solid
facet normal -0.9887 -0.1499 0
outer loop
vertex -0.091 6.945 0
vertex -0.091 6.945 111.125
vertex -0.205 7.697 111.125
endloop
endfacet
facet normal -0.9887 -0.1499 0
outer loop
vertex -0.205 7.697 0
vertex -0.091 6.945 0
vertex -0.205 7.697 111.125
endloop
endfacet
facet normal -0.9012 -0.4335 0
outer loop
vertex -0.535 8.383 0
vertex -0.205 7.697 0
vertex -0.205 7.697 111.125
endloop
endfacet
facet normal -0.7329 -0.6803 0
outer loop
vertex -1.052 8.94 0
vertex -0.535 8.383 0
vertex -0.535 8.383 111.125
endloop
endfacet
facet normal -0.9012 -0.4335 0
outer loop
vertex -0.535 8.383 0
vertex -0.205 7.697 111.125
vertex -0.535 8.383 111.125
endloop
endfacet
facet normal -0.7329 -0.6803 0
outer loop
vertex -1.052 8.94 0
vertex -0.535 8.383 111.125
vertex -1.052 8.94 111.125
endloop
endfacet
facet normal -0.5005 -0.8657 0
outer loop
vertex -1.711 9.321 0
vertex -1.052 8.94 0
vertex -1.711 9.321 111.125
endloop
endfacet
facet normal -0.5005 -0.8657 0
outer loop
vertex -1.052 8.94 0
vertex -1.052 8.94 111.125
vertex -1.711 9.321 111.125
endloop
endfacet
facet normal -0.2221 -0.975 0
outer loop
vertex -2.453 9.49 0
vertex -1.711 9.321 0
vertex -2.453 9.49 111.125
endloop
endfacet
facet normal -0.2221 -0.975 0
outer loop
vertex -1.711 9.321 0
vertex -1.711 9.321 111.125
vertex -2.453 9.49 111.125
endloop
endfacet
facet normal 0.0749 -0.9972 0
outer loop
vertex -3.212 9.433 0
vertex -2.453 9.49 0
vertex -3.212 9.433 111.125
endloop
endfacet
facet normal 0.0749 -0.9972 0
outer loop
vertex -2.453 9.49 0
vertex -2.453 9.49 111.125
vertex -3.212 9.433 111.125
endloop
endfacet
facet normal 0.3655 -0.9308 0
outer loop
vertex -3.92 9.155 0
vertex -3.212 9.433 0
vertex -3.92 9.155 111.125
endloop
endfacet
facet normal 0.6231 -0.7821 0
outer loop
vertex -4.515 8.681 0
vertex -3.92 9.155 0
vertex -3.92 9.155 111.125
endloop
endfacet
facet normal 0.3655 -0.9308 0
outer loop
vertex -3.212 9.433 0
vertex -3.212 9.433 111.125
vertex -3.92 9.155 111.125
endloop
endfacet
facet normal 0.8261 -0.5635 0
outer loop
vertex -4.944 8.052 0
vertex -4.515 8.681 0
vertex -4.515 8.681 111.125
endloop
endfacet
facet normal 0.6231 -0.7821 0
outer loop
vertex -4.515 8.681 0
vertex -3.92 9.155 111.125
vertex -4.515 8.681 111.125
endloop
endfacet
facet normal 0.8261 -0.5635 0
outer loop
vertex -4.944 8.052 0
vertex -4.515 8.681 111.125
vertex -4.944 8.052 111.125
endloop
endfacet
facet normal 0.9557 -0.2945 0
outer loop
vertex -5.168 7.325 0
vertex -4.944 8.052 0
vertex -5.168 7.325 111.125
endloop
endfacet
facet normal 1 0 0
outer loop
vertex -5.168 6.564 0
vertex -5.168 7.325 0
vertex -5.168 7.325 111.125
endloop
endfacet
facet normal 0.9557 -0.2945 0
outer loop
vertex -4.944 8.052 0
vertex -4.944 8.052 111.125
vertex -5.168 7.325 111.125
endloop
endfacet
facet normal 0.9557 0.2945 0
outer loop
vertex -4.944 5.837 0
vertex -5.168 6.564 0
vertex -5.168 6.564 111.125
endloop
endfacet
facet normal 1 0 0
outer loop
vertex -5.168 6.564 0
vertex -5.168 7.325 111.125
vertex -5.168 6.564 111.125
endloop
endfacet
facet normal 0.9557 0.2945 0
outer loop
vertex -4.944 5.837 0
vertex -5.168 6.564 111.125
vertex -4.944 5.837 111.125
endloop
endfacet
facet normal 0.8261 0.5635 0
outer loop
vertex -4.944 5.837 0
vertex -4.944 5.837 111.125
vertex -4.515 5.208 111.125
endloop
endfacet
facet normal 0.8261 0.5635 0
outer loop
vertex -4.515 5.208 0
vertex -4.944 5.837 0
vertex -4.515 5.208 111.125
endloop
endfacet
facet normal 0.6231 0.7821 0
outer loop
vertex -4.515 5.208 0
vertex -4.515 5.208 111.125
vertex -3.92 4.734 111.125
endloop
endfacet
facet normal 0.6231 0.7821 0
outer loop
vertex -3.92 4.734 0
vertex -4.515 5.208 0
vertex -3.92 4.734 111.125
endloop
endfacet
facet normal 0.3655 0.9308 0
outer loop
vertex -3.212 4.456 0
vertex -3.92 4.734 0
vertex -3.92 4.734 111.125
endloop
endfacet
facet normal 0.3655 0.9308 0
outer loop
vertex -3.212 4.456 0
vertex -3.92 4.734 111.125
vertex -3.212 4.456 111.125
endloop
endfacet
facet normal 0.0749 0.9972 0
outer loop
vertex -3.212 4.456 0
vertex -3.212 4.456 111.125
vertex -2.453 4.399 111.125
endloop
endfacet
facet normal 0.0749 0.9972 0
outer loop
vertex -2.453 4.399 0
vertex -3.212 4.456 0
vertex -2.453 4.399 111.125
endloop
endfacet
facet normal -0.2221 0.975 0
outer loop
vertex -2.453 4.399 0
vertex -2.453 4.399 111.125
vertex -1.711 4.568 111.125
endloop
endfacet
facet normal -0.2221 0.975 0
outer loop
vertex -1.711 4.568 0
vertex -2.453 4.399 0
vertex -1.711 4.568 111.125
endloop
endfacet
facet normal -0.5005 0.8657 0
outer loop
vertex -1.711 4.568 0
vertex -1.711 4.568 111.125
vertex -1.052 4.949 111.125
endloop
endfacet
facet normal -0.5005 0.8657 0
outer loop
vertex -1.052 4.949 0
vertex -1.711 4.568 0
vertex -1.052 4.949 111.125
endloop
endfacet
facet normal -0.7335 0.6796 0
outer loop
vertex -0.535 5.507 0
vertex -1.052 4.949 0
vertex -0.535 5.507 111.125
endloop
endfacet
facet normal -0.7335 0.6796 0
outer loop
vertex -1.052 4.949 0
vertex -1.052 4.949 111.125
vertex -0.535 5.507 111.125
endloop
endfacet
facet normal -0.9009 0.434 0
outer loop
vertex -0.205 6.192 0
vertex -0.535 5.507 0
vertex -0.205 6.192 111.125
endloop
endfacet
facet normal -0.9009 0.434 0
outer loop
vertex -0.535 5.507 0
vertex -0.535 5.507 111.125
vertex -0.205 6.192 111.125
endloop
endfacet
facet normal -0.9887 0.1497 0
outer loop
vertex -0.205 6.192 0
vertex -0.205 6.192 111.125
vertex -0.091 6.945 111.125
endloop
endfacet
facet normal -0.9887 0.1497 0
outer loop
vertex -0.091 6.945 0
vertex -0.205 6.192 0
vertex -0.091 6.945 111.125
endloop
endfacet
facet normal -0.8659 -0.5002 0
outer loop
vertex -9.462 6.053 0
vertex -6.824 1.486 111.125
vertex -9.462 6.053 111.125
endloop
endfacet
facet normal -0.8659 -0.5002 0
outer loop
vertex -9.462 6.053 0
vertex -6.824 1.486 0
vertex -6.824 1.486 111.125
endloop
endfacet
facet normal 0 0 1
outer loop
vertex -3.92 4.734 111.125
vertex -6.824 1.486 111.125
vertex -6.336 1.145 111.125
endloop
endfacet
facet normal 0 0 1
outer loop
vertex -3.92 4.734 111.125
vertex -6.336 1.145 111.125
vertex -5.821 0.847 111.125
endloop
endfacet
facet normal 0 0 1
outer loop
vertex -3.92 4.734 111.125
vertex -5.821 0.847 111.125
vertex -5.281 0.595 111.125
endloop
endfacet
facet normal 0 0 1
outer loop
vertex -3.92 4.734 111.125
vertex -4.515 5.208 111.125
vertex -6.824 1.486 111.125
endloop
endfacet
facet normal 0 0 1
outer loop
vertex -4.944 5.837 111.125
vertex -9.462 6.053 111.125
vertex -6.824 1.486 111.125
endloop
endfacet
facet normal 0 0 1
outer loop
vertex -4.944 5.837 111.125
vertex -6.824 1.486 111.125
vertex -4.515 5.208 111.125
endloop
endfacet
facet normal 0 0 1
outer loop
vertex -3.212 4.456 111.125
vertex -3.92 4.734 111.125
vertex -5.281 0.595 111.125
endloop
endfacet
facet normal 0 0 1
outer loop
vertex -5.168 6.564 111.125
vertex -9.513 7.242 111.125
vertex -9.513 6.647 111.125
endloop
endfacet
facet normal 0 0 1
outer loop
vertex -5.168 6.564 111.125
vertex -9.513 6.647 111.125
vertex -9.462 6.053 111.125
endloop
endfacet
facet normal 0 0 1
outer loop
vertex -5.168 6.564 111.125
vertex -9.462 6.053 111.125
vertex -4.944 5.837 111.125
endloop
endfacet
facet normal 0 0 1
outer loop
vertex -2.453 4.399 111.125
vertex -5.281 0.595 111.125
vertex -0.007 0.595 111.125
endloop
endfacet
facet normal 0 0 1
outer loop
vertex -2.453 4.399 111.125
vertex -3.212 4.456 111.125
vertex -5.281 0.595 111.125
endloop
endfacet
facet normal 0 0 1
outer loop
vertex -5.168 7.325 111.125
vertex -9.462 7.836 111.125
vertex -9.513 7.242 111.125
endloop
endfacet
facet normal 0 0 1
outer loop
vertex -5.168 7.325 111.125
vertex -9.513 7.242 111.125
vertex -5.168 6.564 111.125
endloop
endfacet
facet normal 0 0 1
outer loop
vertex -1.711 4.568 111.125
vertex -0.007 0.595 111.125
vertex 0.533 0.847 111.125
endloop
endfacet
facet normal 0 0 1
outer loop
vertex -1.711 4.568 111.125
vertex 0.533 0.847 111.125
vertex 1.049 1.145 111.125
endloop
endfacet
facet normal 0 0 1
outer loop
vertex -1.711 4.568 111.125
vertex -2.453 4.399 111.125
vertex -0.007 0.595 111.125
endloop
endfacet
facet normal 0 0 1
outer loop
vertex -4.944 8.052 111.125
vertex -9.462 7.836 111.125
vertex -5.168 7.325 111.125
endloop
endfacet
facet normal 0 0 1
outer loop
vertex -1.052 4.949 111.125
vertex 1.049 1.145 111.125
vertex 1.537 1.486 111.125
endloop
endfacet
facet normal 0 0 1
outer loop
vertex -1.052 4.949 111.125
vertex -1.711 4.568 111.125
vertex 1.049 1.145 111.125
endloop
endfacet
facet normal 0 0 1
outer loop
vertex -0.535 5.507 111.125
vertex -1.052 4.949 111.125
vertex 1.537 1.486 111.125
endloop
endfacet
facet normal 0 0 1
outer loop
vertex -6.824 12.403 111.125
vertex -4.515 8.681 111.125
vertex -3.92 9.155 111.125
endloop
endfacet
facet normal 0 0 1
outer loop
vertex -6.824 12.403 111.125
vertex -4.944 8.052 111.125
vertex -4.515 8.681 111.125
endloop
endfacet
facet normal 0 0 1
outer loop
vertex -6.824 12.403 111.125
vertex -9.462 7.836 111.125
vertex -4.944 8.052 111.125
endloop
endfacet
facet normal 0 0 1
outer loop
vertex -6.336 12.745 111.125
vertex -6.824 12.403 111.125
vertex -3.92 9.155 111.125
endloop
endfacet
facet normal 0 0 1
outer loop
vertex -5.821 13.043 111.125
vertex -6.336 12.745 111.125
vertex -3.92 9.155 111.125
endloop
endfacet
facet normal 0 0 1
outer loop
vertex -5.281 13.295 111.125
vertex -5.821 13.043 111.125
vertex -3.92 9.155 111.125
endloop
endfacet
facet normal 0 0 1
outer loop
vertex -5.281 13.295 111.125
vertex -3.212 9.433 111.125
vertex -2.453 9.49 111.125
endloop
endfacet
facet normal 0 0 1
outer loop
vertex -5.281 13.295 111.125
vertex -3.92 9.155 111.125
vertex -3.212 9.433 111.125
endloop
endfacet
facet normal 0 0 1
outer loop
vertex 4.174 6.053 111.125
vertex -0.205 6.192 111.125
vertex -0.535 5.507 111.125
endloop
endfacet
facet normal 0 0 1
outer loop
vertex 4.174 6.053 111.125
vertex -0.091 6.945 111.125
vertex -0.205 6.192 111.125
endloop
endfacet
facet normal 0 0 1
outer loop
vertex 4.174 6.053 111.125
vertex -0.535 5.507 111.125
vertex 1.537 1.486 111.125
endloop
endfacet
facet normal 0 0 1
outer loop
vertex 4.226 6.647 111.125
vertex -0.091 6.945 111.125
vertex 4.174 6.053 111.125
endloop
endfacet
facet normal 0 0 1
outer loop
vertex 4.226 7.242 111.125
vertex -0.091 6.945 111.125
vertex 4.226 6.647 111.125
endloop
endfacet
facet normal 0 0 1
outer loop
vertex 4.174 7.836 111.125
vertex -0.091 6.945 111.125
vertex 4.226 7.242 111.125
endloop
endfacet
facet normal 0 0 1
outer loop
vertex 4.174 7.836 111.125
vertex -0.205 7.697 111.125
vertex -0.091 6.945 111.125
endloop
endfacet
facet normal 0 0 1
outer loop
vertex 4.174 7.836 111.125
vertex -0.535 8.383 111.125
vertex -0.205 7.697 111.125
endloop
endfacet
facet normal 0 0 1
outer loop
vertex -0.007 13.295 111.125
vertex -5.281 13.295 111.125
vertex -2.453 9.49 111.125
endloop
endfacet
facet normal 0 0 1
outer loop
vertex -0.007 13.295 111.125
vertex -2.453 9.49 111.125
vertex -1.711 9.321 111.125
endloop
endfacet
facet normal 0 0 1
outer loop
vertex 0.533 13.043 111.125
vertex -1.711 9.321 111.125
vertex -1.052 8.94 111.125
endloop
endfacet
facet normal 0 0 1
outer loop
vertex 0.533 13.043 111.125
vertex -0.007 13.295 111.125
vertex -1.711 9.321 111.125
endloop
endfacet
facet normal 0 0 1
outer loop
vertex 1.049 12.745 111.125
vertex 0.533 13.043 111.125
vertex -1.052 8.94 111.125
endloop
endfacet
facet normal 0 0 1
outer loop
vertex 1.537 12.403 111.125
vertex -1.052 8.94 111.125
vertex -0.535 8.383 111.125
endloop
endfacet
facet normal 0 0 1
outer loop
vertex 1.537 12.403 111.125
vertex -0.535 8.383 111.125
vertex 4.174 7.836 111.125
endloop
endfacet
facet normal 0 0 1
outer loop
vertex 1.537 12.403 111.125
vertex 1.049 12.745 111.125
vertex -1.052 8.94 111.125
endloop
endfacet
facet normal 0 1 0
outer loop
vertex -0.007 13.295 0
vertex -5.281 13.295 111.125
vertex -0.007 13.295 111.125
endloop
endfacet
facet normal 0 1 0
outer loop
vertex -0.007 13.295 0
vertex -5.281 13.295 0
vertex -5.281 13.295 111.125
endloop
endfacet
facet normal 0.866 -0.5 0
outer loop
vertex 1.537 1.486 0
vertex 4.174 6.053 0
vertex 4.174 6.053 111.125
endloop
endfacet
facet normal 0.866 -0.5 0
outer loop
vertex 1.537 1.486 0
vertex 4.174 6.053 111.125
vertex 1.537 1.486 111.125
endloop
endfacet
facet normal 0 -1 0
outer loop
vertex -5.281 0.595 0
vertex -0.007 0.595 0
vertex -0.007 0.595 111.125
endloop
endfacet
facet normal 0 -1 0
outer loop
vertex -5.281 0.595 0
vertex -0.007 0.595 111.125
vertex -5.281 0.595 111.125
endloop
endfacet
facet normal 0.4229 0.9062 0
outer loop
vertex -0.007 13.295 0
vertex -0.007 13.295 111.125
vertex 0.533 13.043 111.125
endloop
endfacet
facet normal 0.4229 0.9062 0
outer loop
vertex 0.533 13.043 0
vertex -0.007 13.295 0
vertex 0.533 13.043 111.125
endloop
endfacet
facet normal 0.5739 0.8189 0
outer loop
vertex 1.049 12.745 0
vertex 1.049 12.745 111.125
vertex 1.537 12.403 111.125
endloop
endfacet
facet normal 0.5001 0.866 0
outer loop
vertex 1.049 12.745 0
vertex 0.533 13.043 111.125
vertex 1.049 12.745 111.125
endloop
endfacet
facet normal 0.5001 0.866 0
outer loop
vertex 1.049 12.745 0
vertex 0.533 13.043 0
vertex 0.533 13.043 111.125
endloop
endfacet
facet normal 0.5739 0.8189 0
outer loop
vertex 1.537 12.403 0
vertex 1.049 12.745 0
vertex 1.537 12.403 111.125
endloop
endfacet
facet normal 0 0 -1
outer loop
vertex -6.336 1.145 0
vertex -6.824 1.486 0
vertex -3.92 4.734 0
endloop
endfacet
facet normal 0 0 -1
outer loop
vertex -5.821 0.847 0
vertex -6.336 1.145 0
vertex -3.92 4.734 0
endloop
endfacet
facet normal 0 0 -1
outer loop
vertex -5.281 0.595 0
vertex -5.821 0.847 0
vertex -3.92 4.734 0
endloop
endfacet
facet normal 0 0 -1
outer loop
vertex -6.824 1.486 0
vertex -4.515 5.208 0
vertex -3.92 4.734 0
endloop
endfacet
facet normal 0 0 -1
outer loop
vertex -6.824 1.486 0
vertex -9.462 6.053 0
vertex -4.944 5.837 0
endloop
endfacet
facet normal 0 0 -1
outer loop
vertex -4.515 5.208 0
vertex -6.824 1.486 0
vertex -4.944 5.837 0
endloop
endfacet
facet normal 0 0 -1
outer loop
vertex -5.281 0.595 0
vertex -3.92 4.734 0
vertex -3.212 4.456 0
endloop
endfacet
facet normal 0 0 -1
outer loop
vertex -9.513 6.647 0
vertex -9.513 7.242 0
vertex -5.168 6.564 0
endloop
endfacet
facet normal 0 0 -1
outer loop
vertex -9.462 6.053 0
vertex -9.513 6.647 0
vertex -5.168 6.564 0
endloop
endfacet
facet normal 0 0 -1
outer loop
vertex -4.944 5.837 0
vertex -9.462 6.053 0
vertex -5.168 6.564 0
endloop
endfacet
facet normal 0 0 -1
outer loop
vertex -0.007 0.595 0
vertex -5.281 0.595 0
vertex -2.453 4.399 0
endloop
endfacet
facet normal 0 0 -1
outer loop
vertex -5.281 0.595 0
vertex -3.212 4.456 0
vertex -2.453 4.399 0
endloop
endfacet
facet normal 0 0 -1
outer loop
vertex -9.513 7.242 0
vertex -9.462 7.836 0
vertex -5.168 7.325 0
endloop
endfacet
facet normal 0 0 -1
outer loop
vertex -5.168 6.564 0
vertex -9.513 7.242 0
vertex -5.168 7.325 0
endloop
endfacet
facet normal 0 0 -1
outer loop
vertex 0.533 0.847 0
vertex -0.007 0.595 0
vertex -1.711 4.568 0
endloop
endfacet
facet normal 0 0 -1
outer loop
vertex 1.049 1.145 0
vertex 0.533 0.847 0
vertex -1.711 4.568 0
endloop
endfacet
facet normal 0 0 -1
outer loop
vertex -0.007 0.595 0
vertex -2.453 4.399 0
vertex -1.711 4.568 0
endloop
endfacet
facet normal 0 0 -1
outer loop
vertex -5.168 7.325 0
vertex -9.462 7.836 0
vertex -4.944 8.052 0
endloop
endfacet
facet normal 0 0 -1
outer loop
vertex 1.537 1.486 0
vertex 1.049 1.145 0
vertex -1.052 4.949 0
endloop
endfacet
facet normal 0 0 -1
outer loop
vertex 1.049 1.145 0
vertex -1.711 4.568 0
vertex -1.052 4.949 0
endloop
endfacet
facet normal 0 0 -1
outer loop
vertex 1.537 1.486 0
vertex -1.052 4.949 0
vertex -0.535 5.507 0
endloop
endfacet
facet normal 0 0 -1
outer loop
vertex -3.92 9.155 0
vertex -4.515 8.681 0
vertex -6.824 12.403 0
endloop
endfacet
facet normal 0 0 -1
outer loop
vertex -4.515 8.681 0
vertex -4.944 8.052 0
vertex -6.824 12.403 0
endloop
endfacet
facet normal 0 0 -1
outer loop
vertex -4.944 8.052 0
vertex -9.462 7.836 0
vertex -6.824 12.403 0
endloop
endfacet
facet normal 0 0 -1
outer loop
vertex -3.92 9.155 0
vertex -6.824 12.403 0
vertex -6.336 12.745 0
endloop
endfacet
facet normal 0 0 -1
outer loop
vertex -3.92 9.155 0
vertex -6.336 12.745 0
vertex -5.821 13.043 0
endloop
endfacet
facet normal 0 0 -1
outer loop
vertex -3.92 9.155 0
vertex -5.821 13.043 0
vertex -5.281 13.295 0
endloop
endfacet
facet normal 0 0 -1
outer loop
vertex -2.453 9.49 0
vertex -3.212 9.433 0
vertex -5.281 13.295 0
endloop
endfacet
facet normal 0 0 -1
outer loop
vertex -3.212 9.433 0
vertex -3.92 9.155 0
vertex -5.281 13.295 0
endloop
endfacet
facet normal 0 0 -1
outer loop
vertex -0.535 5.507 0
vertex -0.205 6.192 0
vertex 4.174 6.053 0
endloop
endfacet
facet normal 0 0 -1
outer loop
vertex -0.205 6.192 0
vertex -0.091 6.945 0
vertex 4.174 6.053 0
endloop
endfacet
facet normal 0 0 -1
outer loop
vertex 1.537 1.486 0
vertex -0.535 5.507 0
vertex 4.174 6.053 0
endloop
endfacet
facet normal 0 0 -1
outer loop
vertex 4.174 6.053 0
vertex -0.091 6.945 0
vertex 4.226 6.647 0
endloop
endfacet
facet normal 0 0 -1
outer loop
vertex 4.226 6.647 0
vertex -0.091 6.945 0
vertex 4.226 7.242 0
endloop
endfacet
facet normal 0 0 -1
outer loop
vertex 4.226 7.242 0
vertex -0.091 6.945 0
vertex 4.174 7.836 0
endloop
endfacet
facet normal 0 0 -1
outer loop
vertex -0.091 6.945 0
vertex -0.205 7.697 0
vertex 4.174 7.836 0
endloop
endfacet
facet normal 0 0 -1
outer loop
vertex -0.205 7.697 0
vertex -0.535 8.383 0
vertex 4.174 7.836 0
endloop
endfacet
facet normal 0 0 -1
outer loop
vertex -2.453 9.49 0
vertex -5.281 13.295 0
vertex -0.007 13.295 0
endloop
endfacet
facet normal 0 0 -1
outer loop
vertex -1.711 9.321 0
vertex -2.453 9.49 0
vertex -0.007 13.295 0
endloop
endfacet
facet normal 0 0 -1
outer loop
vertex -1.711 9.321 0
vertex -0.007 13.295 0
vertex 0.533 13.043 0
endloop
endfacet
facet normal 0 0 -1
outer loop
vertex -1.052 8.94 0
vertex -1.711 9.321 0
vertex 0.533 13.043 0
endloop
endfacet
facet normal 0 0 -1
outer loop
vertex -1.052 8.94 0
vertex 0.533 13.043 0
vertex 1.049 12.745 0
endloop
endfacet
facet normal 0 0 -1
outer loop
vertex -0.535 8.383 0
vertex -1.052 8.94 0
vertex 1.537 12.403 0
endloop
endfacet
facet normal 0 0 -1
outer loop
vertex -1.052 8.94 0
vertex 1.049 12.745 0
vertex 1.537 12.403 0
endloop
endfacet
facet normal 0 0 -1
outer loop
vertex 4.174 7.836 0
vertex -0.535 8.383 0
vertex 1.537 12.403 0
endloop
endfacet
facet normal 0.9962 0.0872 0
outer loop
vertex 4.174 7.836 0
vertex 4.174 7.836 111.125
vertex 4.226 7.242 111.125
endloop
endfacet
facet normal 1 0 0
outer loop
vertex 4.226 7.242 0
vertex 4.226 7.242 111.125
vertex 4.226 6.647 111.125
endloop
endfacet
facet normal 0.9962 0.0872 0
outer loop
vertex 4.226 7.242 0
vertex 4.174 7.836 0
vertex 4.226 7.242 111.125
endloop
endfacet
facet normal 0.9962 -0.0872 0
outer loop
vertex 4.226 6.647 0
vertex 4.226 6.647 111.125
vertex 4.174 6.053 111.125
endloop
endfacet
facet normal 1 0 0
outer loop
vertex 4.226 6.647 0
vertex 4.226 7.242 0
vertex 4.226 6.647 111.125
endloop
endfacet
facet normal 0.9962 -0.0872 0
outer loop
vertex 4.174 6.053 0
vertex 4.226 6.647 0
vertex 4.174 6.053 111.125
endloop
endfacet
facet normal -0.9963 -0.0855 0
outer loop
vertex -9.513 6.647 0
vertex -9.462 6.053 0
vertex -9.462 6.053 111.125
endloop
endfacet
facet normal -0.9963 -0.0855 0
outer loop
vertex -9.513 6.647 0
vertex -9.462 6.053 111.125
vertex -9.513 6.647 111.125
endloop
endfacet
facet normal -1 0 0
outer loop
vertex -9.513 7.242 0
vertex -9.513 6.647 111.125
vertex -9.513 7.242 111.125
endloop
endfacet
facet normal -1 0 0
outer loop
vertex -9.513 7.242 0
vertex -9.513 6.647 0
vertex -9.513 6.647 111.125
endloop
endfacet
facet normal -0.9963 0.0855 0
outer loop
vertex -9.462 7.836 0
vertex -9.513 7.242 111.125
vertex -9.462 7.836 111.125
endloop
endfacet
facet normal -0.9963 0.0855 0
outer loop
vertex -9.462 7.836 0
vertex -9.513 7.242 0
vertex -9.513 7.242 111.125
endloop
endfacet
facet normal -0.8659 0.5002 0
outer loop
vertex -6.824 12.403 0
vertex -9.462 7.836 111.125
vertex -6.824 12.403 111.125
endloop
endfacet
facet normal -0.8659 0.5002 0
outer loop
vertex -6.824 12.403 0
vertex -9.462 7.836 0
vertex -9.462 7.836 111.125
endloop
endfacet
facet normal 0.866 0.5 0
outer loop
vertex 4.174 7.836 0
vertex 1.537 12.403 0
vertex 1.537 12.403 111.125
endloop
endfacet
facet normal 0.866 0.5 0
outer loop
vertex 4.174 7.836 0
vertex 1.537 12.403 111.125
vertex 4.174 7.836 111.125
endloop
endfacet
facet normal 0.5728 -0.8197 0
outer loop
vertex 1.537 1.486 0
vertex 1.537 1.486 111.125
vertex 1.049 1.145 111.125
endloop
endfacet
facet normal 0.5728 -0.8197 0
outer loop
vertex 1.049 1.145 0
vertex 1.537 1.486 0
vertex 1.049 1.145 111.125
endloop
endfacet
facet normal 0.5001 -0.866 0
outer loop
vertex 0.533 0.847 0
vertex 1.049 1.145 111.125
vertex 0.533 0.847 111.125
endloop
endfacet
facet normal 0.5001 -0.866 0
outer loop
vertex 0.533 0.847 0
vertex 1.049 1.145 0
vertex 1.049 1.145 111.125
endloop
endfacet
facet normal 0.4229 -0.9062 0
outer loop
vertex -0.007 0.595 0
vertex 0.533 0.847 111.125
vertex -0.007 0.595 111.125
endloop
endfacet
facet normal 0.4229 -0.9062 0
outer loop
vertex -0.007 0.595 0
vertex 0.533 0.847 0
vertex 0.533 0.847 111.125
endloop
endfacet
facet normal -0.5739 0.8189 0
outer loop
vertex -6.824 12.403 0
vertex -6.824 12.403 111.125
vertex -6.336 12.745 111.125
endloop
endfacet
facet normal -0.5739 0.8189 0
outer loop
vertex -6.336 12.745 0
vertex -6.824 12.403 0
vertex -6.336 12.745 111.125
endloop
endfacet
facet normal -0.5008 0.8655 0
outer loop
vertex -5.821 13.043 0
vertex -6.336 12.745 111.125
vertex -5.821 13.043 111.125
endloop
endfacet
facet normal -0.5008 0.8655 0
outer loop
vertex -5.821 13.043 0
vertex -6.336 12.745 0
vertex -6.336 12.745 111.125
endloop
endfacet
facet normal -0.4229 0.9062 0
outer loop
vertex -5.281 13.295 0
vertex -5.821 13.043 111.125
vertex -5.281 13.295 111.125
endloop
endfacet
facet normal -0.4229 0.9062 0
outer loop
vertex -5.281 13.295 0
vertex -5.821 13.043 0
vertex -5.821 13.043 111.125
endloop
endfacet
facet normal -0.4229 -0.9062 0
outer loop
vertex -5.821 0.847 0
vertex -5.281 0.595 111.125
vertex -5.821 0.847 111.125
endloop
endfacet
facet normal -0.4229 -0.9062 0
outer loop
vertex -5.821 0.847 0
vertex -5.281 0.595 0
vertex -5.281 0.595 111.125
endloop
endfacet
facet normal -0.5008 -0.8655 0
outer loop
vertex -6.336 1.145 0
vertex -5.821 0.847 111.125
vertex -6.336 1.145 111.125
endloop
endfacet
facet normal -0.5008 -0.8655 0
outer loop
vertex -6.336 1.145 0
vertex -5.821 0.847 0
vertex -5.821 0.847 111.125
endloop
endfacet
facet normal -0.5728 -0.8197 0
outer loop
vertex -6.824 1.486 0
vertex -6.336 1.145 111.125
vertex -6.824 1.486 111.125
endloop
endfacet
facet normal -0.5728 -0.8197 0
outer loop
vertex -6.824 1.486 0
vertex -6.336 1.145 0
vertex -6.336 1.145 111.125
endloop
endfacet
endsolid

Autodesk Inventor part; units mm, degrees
ref_plane "YZ Plane" through (0, 0, 0) normal (1, 0, 0) x (0, 1, 0)
ref_plane "XZ Plane" through (0, 0, 0) normal (0, 1, 0) x (-1, 0, 0)
ref_plane "XY Plane" through (0, 0, 0) normal (0, 0, 1) x (1, 0, 0)
sketch "Sketch1" plane through (0, 0, 0) normal (0, 0, 1) x (1, 0, 0)
  circle A0 centre (-2.6438, 6.9447) radius 6.8758
  line L0 (-9.4616, 7.8359) -> (-6.8245, 12.4034)
  line L1 (-6.8245, 1.4859) -> (-9.4616, 6.0534)
  line L2 (-0.0068, 0.5947) -> (-5.2808, 0.5947)
  line L3 (4.174, 6.0534) -> (1.537, 1.4859)
  line L4 (1.537, 12.4034) -> (4.174, 7.8359)
  line L5 (-5.2808, 13.2947) -> (-0.0068, 13.2947)
  point P0 (0, 0)
  point P1 (1.537, 1.4859)
  dimension "d0" = 13.7516
  dimension "d4" = 360
extrude "Extrusion1" add sketch "Sketch1" along normal blind 111.125 contours A0 L3 L2 L1 L0 L5 L4
sketch "Sketch2" plane through (0, 0, 111.125) normal (0, 0, 1) x (1, 0, 0)
  circle A0 centre (-2.6438, 6.9447) radius 2.5527
  line L0 (-5.2808, 0.5947) -> (-0.0068, 0.5947) projected
  line L1 (-2.6438, 6.9447) -> (-5.2808, 0.5947) construction
  line L2 (-2.6438, 6.9447) -> (-0.0068, 0.5947) construction
  point P0 (0, 0)
  dimension "d8" = 5.1054
  dimension "d9" = 6.35
extrude "Extrusion2" cut sketch "Sketch2" against normal blind 111.125
equation "\"d6\" = d5"
equation "\"d10\" = d5"
equation "\"d5\" = 111.125"
properties part number "5.5 thundershaft" material "Aluminum 6061"
